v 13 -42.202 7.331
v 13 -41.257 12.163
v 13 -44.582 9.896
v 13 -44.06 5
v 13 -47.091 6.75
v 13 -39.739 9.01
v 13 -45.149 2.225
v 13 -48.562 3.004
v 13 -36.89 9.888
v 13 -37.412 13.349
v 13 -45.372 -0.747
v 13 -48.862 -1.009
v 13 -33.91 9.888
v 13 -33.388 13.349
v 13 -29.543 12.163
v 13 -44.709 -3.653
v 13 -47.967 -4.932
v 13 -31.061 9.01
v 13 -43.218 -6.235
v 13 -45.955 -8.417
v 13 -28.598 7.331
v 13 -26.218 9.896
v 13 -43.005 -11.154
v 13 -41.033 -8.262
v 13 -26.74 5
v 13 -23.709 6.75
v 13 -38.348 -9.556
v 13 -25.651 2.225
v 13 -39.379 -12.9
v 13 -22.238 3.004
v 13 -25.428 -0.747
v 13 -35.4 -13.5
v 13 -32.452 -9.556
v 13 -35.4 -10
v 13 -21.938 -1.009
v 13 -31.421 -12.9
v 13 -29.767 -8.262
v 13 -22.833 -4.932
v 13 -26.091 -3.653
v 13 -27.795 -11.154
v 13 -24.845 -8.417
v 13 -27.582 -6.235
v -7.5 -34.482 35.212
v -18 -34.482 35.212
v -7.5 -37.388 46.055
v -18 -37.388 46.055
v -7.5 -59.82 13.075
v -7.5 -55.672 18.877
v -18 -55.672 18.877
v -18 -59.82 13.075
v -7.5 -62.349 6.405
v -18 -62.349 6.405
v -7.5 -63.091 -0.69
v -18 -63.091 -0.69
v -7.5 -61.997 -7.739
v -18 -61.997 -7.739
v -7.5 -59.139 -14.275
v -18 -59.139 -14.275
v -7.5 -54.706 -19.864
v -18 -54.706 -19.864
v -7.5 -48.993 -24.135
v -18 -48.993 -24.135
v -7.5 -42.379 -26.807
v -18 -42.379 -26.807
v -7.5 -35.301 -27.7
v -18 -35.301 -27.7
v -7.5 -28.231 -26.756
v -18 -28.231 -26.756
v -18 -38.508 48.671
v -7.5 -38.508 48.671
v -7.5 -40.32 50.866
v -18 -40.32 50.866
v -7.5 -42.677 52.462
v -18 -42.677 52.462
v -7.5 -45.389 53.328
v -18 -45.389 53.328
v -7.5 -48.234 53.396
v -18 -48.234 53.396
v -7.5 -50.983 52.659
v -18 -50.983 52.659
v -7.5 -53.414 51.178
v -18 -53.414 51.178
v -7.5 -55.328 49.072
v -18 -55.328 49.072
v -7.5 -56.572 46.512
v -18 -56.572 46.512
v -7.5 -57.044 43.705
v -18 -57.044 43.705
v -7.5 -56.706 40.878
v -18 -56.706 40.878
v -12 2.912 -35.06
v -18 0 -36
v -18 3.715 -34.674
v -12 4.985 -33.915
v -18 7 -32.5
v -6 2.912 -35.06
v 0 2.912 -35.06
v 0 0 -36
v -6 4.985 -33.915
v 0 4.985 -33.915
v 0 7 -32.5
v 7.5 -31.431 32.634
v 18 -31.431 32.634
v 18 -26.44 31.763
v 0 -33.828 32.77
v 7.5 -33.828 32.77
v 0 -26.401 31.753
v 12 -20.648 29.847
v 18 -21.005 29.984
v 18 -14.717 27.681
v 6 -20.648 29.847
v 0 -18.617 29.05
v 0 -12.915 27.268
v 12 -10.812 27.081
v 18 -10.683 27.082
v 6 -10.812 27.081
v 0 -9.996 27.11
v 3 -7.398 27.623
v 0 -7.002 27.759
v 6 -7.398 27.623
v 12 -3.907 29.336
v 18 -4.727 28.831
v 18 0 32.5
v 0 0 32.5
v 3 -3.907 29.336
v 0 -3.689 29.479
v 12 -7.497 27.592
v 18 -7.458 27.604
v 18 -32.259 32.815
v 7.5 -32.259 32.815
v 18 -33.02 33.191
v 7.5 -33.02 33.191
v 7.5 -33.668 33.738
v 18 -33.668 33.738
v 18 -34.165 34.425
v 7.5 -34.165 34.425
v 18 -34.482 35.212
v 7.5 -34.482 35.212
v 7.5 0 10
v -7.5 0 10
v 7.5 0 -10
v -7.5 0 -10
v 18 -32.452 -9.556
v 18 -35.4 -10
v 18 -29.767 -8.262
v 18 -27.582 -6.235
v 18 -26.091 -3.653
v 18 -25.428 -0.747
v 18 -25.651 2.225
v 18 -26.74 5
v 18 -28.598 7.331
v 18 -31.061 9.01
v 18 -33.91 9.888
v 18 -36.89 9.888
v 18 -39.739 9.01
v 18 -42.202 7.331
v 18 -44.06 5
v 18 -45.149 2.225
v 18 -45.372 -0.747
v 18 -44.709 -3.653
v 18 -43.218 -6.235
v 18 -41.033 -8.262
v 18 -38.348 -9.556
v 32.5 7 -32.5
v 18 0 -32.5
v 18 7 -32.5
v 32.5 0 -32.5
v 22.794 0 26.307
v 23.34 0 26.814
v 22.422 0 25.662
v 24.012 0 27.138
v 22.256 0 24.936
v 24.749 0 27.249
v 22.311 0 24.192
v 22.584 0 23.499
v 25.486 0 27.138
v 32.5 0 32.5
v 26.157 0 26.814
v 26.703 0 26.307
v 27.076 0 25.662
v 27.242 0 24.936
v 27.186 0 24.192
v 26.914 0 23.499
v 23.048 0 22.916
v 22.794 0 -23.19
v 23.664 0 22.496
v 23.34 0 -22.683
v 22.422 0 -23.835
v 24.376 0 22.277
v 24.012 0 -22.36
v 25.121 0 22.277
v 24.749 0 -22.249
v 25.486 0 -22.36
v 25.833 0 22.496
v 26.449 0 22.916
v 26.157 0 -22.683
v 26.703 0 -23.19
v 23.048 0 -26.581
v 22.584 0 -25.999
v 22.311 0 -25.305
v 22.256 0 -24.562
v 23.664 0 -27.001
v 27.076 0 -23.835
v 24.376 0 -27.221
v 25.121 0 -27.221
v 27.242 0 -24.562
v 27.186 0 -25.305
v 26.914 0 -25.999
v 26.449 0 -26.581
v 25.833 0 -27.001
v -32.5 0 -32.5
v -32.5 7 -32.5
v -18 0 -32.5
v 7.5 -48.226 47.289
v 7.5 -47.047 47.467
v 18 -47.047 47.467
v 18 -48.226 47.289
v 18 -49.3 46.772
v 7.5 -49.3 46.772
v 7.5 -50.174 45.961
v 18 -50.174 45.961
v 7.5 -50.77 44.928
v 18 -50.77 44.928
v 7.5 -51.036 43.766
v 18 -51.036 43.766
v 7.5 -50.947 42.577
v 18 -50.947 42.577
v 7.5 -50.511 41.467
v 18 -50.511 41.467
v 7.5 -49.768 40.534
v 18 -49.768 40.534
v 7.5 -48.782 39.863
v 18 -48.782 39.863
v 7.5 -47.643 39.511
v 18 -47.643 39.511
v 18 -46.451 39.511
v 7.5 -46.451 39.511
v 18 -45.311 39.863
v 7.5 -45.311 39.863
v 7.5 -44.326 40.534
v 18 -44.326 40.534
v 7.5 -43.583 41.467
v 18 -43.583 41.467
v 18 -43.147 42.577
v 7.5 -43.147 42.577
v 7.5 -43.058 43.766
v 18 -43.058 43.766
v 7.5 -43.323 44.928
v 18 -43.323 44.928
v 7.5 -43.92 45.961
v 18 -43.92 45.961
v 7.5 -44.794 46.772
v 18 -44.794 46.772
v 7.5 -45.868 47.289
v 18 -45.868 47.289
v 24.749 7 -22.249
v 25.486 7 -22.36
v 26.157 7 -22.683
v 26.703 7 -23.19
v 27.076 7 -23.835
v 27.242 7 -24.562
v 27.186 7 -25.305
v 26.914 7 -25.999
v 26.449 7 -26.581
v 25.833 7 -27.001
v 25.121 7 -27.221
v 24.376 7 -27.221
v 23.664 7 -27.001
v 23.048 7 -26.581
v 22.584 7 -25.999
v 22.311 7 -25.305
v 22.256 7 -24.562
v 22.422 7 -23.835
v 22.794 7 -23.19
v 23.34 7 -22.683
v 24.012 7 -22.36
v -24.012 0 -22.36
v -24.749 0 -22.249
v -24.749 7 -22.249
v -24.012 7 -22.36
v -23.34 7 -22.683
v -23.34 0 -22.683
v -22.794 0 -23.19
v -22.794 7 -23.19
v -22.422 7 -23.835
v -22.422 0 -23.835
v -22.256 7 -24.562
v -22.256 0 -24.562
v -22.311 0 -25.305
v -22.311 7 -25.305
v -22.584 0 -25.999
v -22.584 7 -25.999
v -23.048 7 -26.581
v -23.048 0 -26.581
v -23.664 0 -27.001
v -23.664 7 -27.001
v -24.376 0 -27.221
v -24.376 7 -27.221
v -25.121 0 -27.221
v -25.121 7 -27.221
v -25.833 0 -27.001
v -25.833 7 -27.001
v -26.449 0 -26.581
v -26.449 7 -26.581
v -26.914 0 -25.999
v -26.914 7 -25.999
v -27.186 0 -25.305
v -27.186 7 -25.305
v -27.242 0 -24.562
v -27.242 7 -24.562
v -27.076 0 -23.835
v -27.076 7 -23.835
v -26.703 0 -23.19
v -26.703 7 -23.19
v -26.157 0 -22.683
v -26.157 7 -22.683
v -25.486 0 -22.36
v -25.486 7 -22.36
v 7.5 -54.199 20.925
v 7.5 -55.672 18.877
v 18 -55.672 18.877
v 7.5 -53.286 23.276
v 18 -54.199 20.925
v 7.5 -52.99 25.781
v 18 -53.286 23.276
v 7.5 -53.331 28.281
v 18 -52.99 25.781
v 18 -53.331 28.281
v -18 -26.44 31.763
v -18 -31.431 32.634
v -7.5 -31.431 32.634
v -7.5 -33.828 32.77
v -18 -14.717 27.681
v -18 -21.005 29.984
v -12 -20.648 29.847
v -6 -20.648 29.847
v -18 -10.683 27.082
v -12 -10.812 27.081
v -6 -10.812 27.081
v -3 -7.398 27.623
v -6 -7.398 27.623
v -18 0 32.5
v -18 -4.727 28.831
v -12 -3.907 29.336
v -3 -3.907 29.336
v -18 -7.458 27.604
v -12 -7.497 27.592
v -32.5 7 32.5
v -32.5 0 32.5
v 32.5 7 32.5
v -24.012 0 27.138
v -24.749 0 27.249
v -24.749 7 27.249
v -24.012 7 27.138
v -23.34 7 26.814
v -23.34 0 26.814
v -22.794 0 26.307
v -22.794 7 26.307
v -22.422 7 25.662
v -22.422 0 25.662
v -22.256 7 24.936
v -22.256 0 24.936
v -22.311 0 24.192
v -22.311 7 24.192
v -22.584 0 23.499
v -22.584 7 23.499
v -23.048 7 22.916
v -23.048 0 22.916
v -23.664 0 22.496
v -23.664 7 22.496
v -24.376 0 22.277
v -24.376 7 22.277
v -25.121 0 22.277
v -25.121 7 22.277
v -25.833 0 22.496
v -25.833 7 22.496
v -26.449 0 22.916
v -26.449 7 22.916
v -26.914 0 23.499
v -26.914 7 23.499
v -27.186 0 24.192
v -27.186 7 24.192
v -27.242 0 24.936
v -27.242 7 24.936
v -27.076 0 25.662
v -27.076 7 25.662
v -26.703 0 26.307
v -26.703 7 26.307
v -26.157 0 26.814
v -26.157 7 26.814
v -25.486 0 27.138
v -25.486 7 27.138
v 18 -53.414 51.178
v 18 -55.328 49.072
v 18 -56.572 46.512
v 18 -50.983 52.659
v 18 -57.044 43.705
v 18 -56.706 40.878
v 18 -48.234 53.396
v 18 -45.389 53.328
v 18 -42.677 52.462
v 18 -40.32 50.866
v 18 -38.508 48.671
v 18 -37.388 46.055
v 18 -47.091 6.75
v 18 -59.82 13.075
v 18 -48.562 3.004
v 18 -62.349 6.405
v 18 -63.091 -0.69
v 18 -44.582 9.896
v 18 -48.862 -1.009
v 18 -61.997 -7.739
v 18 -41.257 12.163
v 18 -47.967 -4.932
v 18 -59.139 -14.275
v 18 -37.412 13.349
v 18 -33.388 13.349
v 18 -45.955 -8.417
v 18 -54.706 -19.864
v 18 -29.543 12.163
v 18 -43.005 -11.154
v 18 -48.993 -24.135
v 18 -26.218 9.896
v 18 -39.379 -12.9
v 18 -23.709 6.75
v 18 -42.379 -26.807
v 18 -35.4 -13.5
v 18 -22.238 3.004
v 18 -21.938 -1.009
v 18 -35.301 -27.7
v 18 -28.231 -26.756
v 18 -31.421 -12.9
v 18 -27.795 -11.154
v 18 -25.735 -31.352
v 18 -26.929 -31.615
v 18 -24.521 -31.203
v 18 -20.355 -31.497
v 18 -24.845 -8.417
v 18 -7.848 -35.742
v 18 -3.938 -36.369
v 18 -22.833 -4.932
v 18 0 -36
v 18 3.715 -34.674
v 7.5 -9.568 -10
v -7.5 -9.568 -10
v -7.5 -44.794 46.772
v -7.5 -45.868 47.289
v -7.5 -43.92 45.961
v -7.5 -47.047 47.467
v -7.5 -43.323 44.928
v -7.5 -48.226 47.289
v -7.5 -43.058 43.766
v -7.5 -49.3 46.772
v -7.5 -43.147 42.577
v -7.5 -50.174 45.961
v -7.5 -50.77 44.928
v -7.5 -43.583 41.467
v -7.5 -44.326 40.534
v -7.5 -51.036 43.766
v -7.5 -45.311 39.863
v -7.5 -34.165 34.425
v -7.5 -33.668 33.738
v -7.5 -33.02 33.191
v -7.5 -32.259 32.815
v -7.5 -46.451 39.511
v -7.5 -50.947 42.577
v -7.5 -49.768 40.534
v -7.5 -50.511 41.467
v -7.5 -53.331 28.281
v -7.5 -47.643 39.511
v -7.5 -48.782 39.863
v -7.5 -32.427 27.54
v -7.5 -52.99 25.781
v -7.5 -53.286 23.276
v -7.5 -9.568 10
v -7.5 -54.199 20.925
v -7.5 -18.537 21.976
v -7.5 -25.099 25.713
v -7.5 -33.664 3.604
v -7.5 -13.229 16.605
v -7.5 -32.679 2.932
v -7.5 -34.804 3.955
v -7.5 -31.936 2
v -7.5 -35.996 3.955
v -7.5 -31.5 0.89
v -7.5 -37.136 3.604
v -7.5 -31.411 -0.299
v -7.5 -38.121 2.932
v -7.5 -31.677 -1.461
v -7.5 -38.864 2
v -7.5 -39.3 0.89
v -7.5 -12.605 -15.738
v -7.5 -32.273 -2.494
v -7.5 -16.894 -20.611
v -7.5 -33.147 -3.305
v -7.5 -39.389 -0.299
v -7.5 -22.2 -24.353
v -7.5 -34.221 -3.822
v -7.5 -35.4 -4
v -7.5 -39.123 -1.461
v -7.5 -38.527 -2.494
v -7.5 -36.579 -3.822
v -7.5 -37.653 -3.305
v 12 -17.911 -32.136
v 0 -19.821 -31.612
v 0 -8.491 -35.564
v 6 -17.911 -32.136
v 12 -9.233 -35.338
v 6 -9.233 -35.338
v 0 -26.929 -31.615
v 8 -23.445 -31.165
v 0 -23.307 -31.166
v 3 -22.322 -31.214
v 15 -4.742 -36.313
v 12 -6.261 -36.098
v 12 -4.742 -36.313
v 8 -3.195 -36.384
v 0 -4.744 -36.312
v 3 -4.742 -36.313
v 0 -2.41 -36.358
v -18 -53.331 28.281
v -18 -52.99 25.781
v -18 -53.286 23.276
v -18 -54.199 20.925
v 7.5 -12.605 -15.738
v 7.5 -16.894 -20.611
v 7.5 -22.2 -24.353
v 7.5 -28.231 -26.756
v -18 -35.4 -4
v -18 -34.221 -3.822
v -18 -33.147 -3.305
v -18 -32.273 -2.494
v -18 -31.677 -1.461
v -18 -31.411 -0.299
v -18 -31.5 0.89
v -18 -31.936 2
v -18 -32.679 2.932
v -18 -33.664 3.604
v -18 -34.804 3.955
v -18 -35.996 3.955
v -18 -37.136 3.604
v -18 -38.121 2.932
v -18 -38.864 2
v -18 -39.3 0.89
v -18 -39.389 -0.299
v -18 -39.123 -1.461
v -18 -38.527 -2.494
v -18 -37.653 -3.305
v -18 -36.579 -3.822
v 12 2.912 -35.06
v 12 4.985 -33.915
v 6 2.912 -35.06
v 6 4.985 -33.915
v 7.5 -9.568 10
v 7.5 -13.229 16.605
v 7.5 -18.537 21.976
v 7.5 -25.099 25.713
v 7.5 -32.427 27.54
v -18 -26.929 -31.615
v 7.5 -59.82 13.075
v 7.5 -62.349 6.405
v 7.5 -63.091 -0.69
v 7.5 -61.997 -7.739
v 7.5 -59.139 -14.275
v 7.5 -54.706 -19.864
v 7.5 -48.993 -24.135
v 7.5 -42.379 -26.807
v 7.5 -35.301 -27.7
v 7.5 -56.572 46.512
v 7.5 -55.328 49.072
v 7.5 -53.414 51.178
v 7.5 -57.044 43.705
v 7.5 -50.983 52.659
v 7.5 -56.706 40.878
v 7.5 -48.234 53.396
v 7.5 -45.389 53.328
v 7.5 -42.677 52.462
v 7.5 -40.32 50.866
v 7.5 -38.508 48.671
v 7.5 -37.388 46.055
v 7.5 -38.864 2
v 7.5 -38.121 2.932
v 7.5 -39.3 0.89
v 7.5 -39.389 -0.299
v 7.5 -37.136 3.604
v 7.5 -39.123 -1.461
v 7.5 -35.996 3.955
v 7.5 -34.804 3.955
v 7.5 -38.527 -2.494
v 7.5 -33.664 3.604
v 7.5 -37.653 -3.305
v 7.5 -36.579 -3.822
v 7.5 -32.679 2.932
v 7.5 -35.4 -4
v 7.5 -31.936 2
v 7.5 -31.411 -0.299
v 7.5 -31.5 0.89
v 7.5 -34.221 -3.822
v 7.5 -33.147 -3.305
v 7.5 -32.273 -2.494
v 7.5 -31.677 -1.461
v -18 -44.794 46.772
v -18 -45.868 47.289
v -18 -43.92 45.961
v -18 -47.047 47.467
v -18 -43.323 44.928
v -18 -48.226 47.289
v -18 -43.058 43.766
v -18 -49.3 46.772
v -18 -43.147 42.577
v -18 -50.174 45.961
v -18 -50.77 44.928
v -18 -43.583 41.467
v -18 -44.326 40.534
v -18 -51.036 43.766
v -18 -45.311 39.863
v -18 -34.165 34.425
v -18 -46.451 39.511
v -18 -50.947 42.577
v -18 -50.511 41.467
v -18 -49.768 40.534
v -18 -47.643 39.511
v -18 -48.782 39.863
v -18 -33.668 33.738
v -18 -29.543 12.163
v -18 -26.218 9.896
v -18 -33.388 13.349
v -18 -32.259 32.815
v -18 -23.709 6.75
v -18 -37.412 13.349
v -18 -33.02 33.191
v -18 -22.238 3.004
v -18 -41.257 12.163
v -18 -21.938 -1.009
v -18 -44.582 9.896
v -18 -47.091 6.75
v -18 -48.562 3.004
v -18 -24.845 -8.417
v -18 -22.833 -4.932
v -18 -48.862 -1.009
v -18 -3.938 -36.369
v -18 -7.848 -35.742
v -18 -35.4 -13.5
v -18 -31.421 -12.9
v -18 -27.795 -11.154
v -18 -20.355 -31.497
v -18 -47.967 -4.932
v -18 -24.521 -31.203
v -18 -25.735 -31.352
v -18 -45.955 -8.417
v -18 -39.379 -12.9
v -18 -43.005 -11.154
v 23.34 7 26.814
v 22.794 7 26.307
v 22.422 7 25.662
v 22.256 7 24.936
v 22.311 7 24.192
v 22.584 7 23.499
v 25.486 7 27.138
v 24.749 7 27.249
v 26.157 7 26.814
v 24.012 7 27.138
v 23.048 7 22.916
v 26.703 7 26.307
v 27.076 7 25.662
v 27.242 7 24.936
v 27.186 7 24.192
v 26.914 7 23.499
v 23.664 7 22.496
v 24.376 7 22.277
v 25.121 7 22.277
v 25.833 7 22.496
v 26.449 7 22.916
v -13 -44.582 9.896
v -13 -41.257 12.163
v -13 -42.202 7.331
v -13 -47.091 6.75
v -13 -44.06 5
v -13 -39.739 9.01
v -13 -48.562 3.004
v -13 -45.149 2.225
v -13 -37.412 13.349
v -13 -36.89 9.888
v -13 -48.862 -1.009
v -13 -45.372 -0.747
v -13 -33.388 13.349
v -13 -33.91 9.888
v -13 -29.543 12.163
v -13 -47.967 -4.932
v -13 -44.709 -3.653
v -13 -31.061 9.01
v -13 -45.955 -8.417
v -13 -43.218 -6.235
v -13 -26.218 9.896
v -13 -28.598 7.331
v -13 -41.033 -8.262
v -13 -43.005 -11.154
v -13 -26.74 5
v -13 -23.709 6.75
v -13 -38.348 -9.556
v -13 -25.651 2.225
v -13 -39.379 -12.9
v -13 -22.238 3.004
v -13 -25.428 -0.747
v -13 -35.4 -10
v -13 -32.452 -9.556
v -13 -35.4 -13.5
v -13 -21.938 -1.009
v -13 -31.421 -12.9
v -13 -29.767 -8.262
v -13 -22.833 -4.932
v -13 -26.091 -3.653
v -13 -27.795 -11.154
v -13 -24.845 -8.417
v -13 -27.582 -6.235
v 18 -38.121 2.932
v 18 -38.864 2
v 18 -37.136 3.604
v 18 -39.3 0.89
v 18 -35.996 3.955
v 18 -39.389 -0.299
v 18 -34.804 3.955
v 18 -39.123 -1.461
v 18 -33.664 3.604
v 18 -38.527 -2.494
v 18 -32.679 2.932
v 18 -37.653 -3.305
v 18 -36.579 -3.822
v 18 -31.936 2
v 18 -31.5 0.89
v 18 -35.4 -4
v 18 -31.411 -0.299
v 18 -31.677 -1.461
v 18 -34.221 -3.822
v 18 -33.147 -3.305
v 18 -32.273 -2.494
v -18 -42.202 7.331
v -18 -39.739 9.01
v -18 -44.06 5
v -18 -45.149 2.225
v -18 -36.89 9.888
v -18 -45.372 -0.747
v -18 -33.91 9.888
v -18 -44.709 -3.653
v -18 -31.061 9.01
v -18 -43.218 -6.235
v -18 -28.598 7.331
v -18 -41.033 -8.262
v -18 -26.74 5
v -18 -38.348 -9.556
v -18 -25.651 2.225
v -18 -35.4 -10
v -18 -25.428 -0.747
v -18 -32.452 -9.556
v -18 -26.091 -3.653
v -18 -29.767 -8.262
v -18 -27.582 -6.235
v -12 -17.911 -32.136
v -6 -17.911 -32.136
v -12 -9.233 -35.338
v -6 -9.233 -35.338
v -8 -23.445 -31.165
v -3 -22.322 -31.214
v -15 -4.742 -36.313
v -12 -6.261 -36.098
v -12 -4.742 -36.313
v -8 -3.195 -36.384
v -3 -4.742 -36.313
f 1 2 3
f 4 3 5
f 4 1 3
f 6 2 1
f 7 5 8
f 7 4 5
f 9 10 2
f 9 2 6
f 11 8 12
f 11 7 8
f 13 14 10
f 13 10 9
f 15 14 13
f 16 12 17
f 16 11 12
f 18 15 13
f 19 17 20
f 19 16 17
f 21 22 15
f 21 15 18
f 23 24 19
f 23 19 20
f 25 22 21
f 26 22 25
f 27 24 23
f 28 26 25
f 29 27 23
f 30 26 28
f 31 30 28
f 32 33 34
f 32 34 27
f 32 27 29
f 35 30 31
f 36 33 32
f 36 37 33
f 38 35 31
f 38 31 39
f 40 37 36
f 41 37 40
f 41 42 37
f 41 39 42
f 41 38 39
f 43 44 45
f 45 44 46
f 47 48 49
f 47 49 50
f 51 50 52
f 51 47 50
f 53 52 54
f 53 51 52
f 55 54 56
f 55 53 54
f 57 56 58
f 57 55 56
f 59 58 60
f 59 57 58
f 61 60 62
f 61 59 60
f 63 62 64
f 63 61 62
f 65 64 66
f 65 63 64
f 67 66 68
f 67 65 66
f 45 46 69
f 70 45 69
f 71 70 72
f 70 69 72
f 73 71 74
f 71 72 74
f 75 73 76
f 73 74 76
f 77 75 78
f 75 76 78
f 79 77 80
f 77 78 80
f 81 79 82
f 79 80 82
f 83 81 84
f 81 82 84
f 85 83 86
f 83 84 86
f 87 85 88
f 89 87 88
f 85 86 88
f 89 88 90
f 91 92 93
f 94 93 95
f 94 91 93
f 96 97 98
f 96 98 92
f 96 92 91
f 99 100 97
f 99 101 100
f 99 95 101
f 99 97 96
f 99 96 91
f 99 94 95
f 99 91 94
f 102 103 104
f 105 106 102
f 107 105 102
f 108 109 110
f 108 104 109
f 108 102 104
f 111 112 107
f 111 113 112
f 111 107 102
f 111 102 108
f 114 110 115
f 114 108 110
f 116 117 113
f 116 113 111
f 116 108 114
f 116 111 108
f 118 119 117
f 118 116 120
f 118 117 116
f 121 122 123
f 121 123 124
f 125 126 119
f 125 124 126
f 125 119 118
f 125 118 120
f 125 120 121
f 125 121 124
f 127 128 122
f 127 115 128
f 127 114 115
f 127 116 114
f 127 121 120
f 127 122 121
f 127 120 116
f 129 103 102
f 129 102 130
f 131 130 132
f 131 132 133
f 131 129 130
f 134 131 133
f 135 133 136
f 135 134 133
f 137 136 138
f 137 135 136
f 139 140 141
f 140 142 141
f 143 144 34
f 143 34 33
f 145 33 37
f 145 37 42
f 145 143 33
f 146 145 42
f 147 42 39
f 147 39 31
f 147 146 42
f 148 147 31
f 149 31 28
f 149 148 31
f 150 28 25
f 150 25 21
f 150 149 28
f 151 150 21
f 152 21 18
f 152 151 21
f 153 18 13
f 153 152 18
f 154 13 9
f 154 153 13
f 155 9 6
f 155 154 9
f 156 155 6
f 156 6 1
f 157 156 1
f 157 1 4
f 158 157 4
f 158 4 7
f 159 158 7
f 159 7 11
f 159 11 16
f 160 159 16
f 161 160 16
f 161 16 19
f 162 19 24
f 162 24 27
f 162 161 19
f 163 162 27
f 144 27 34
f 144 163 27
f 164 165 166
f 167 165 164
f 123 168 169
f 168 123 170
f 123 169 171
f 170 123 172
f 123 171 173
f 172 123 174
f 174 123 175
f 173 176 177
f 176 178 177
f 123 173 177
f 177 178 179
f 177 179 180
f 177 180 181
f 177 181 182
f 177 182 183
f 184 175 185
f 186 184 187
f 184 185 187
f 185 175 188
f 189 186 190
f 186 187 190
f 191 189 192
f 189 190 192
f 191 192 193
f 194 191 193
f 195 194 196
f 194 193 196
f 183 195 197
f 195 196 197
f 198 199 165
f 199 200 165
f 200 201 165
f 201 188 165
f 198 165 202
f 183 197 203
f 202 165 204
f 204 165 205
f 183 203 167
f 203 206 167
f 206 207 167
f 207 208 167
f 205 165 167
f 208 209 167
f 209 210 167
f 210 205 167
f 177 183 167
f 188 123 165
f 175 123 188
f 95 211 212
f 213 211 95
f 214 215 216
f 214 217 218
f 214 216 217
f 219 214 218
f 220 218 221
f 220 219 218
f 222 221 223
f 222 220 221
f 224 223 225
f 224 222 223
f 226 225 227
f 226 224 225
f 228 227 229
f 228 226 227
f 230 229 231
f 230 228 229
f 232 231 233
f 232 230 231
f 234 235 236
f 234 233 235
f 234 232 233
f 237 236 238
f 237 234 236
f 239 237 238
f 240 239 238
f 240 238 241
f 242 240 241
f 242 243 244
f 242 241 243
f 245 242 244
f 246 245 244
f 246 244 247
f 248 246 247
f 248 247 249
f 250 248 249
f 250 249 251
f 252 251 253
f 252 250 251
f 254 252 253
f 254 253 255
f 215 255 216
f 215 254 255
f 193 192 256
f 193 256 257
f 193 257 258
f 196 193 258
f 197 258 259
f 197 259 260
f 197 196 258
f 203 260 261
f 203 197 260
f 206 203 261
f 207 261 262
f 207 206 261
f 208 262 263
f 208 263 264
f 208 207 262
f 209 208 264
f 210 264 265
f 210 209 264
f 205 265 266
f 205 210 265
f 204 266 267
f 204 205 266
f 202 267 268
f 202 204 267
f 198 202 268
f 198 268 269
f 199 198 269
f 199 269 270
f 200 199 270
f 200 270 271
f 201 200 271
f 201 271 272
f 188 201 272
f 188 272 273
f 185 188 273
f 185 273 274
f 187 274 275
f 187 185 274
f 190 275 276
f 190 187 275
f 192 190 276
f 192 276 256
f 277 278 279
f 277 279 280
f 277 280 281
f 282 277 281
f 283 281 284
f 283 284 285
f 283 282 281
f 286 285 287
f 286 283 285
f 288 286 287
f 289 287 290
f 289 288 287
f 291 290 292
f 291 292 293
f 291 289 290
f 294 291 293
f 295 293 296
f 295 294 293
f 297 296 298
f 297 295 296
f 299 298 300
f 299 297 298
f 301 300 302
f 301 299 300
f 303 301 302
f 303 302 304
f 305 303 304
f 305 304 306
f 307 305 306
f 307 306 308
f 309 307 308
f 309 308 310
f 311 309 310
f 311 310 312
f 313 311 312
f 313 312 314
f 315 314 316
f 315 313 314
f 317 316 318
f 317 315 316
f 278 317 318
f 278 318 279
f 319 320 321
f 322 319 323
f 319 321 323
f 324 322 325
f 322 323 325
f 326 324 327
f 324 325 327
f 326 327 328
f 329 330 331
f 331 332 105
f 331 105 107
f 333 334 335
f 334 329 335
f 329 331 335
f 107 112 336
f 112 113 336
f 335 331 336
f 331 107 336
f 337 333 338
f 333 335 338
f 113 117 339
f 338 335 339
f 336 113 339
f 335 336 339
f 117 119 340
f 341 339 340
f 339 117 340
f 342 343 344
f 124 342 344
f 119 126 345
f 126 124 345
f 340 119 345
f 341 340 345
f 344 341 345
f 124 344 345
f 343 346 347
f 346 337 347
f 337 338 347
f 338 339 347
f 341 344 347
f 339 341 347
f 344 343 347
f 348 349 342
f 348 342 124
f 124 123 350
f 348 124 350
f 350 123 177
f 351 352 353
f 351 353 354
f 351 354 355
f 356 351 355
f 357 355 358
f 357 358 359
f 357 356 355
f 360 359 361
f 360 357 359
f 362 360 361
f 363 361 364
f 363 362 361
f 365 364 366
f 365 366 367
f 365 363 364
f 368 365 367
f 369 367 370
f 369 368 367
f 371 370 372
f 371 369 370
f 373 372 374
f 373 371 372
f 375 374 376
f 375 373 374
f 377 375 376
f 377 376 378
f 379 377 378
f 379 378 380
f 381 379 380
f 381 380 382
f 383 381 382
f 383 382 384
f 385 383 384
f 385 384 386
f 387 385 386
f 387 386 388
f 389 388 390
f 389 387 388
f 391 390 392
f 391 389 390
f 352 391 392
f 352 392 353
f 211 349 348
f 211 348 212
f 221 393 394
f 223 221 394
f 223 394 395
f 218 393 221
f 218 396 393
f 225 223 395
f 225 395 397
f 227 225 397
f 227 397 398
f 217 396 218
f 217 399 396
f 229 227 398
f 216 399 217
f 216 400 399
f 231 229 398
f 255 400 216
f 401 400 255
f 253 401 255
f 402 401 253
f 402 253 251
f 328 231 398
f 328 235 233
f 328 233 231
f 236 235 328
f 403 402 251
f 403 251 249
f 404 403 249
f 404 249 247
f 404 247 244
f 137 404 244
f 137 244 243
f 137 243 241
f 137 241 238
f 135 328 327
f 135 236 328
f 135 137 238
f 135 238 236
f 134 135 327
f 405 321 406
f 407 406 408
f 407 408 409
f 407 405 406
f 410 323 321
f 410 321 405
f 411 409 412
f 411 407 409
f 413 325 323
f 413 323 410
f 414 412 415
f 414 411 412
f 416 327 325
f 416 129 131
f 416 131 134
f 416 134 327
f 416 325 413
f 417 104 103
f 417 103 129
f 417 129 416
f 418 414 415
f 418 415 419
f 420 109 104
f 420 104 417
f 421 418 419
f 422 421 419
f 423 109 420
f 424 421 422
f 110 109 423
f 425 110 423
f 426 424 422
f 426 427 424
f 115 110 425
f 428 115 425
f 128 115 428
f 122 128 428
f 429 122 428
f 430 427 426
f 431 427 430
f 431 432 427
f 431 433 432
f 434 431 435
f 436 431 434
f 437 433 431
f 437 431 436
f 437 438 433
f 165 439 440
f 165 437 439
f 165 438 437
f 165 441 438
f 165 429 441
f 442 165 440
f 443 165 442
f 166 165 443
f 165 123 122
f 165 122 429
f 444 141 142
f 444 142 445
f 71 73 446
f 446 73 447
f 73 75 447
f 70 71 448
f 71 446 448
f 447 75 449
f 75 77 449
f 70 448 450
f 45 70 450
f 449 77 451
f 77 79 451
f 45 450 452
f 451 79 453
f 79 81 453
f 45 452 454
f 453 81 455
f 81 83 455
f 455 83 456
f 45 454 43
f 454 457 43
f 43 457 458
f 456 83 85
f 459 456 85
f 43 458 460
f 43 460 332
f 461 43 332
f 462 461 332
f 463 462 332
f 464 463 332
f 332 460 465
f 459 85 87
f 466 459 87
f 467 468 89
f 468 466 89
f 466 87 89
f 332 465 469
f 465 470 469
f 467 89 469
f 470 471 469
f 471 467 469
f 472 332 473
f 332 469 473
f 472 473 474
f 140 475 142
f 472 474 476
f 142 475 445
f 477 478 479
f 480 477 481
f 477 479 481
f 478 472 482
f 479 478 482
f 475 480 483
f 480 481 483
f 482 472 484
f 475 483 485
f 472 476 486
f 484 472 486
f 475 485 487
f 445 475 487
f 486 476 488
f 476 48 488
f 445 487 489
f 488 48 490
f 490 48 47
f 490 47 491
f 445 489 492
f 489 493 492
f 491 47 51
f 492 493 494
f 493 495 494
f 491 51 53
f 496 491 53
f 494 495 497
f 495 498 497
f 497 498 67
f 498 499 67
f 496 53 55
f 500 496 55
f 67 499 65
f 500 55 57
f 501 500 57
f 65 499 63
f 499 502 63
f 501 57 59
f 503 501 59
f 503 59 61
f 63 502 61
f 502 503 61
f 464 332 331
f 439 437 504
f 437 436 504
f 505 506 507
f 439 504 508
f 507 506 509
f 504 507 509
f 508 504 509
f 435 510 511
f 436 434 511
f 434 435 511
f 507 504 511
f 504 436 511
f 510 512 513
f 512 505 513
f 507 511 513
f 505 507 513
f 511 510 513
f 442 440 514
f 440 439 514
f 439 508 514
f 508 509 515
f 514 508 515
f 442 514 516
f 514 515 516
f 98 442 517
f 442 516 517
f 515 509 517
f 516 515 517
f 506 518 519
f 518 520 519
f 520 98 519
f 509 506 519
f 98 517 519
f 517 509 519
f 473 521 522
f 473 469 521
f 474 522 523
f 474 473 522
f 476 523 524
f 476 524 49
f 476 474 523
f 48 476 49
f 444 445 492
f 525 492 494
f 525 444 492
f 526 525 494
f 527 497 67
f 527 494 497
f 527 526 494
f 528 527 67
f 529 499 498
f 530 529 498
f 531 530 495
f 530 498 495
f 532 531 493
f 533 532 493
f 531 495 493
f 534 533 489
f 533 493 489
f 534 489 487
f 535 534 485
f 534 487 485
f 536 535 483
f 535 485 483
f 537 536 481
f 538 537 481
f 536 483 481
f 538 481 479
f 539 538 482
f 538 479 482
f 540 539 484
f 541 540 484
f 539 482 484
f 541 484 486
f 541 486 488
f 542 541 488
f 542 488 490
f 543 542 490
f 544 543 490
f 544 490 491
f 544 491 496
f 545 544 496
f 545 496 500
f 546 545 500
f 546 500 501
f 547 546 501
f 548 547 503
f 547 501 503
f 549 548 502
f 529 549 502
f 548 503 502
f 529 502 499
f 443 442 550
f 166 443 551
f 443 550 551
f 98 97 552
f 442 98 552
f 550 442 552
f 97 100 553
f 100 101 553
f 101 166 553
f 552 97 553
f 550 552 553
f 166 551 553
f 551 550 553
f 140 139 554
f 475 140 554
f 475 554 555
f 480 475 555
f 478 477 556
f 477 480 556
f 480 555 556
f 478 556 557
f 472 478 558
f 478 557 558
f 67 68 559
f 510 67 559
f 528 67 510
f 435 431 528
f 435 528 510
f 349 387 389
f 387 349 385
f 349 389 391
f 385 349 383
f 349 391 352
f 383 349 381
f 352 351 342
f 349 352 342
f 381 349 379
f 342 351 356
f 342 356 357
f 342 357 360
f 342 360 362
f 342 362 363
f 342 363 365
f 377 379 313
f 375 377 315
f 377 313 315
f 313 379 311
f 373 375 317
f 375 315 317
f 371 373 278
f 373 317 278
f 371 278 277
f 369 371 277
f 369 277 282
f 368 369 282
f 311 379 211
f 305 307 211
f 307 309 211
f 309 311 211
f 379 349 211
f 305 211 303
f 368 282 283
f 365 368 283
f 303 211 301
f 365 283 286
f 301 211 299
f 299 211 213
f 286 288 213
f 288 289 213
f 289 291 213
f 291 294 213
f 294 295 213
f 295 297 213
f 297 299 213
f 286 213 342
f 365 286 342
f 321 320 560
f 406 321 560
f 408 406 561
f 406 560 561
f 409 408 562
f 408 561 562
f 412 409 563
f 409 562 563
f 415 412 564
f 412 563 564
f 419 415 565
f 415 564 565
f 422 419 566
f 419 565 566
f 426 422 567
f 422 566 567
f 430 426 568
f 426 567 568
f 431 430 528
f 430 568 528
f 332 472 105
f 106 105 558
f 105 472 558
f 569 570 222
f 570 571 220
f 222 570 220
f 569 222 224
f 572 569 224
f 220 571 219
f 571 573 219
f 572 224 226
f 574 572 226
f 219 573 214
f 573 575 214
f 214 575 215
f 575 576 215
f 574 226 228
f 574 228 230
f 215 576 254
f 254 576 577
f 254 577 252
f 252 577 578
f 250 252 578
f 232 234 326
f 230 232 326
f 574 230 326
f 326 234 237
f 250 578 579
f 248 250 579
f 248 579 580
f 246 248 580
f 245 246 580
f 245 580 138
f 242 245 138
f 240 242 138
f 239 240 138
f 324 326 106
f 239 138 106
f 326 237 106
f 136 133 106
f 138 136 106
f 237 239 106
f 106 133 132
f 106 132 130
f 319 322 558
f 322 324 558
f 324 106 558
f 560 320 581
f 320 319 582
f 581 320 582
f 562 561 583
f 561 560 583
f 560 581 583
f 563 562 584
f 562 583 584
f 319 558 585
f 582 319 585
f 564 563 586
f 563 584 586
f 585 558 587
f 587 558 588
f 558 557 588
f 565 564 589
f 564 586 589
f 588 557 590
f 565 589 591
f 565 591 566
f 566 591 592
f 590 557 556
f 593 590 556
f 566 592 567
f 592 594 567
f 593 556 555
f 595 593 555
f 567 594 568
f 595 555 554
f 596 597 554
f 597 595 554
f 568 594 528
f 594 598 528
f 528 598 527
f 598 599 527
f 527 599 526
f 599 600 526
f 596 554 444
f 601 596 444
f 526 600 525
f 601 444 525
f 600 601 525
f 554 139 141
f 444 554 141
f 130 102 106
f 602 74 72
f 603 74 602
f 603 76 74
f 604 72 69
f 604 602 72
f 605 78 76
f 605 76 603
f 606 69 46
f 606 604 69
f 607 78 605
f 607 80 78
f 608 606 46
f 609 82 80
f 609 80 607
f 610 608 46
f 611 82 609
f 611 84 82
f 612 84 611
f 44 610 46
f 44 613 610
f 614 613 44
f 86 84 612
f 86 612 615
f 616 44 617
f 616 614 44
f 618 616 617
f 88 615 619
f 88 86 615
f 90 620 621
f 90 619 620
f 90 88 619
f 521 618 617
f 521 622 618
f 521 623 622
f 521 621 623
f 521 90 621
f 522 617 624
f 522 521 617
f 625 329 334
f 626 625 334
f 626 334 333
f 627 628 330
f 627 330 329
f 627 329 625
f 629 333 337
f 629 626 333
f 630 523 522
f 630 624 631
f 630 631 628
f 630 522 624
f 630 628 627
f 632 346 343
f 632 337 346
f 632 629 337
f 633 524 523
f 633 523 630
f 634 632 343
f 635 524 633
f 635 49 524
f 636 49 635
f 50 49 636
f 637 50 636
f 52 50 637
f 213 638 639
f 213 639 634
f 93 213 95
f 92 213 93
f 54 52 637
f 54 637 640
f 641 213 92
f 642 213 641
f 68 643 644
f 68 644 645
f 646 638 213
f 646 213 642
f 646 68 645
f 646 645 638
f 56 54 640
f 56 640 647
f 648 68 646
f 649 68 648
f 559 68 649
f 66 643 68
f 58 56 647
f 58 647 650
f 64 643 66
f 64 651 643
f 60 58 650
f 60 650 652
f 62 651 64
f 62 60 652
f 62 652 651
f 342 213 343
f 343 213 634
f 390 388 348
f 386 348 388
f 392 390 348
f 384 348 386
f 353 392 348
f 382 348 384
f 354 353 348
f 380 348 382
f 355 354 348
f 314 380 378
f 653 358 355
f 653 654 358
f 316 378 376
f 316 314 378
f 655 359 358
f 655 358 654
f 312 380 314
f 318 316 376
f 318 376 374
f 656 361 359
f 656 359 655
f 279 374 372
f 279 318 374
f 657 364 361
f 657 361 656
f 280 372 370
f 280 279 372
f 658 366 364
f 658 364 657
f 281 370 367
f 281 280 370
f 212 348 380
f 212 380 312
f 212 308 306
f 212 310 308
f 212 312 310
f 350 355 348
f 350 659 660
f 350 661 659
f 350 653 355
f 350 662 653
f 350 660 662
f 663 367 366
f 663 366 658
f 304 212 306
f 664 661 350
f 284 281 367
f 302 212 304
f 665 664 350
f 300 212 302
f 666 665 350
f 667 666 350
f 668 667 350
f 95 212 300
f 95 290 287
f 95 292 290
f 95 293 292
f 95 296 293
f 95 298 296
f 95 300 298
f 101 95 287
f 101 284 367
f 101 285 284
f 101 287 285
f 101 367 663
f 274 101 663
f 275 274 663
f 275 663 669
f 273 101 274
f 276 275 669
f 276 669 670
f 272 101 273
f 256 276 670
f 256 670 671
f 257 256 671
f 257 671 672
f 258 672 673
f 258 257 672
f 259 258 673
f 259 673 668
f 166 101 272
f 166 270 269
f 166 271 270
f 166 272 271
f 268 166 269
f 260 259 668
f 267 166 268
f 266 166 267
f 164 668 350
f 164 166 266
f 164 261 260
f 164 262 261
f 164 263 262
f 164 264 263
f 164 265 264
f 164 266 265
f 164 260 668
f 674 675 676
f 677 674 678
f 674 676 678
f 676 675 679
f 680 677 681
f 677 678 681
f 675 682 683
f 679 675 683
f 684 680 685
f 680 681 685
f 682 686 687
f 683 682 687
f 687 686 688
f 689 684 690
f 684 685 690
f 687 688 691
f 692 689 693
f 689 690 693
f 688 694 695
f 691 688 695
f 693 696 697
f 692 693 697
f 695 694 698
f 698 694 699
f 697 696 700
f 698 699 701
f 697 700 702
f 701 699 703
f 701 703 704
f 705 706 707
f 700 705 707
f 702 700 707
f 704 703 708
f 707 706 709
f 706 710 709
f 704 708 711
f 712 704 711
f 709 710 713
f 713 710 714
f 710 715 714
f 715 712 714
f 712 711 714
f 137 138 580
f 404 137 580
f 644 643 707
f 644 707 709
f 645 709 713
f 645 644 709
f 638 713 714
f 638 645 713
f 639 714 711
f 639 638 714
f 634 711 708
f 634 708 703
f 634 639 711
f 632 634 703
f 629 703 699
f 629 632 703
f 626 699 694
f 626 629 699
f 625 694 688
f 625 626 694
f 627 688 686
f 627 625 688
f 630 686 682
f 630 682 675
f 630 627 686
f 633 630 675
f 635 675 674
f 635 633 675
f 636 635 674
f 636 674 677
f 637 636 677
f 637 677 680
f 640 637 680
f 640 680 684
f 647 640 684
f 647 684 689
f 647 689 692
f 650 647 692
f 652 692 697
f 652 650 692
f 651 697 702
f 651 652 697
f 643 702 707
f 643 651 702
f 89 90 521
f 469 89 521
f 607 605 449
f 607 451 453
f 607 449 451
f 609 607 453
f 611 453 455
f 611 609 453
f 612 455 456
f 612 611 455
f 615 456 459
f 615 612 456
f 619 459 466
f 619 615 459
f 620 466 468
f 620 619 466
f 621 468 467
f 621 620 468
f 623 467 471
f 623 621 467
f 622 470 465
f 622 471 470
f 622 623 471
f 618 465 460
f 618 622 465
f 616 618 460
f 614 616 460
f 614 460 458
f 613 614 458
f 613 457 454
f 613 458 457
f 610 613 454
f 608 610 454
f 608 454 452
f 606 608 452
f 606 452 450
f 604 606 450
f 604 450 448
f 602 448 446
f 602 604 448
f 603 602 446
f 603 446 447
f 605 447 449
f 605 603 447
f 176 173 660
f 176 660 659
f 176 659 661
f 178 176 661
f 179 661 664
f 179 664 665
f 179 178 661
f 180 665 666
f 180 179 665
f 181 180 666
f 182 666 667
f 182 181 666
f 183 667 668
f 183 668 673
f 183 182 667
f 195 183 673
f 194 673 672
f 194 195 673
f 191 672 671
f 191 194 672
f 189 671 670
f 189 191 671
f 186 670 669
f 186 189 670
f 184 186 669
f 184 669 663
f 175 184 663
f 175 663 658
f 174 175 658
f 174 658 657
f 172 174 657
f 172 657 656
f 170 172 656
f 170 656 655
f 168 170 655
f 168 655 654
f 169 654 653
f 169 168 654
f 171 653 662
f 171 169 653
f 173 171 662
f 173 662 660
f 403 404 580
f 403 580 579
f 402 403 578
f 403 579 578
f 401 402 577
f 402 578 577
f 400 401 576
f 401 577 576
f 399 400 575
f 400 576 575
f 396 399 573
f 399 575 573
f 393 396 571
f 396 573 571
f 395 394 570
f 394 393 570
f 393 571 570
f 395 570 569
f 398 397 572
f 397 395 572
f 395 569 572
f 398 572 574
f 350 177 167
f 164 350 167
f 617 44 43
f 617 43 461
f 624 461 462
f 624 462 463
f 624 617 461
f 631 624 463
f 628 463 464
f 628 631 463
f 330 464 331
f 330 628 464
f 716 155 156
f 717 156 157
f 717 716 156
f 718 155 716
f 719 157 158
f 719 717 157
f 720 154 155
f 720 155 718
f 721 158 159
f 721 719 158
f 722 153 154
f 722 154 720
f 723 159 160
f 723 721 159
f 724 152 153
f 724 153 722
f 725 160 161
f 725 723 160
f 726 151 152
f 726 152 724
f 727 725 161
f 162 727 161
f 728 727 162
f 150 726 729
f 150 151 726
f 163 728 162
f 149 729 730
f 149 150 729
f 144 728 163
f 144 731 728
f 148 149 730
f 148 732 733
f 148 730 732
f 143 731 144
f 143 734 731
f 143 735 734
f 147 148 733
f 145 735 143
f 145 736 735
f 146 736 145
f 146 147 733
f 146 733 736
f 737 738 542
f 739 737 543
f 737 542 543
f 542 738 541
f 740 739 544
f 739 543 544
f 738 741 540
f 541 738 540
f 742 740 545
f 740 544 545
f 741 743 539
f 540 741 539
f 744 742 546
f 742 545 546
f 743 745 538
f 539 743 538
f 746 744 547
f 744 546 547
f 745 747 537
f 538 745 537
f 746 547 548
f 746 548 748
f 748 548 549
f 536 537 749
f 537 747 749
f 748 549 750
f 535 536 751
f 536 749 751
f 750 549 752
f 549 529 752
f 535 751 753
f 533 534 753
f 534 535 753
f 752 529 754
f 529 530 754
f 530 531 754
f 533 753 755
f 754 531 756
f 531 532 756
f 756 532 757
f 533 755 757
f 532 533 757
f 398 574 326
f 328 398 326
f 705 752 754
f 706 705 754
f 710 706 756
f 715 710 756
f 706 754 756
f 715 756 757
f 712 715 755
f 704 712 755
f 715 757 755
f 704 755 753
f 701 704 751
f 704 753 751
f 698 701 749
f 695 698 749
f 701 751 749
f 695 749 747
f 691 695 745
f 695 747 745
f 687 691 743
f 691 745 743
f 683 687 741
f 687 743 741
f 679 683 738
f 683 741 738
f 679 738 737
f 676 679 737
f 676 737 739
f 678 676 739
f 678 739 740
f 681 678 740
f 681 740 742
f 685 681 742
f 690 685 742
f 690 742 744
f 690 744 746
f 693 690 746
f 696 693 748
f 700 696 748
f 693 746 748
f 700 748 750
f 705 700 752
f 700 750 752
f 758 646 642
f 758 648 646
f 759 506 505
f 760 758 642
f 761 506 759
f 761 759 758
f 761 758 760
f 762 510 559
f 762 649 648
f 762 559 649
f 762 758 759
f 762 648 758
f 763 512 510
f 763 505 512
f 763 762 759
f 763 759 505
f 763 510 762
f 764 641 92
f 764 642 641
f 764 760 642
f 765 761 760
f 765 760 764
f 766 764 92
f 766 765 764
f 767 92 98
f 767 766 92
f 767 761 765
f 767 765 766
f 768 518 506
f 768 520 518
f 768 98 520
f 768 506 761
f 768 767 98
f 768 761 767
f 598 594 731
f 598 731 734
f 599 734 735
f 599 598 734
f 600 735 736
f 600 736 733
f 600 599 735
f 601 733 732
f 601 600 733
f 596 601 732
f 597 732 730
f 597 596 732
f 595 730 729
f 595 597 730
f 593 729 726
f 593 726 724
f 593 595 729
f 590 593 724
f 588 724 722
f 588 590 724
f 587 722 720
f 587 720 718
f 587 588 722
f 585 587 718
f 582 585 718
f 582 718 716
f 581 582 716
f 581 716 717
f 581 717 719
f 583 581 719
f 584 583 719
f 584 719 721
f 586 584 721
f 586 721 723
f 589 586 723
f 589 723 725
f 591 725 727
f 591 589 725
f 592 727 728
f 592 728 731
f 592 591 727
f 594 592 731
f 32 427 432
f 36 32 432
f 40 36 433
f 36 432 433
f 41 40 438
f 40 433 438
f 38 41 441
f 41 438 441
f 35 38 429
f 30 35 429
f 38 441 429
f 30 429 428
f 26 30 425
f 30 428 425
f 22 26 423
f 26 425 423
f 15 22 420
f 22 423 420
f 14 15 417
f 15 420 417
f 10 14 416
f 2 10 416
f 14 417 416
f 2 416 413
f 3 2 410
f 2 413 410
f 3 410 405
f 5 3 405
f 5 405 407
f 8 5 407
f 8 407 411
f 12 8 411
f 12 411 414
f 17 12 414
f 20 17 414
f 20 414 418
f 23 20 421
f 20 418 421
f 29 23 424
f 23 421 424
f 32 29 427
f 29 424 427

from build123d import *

# Parameters (mm, degrees)
SKETCH1_W                       = 65
SKETCH1_H                       = 65
SKETCH1_R                       = 2.5
BOSS_EXTRUDE1_DEPTH             = 7
BOSS_EXTRUDE2_START             = 7.5
SKETCH2_R                       = 4
BOSS_EXTRUDE2_DEPTH             = 10.5
BOSS_EXTRUDE3_REACH             = 80.065
BOSS_EXTRUDE3_DIRECTION_2_REACH = 80.065
BOSS_EXTRUDE7_START             = -18
BOSS_EXTRUDE7_DEPTH             = 36
SKETCH6_W                       = 15
SKETCH6_H                       = 30
CUT_EXTRUDE1_DEPTH              = 81.472268493
SKETCH8_R                       = 13.5
SKETCH8_R_2                     = 10
CUT_EXTRUDE3_DEPTH              = 5
CUT_EXTRUDE4_DEPTH              = 91.23260041
CUT_EXTRUDE4_DEPTH_BACK         = 91.23260041
SKETCH7_R                       = 4
FILLET16_R                      = 3.5
FILLET17_R                      = 3.5
FILLET19_R                      = 10


with BuildPart() as part:
    # Sketch1 → Boss-Extrude1 (new body)
    with BuildSketch(Plane(origin=(0, 0, 0), x_dir=(1, 0, 0), z_dir=(0, 1, 0))):
        Rectangle(SKETCH1_W, SKETCH1_H)
        with Locations(Location((-24.748737342, 24.748737342, 0), (0, 0, 270))):
            Circle(SKETCH1_R, mode=Mode.SUBTRACT)
        with Locations(Location((24.748737342, 24.748737342, 0), (0, 0, 270))):
            Circle(SKETCH1_R, mode=Mode.SUBTRACT)
        with Locations(Location((24.748737342, -24.748737342, 0), (0, 0, 270))):
            Circle(SKETCH1_R, mode=Mode.SUBTRACT)
        with Locations(Location((-24.748737342, -24.748737342, 0), (0, 0, 270))):
            Circle(SKETCH1_R, mode=Mode.SUBTRACT)
    extrude(amount=BOSS_EXTRUDE1_DEPTH)

    # Sketch2 → Boss-Extrude2 (add)
    with BuildSketch(Plane(origin=(0, 0, 0), x_dir=(0, 0, -1), z_dir=(1, 0, 0)).offset(BOSS_EXTRUDE2_START)):
        with BuildLine():
            Line((10, -9.568043047), (10, 1.517986249))
            Line((10, 1.517986249), (-10, 1.517986249))
            Line((-10, 1.517986249), (-10, -9.568043047))
            ThreePointArc((-10, -9.568043047), (0, -63.1), (10, -9.568043047))
        make_face()
        with Locations((0, -35.4)):
            Circle(SKETCH2_R, mode=Mode.SUBTRACT)
    boss_extrude2 = extrude(amount=BOSS_EXTRUDE2_DEPTH)

    # Mirror1: Boss-Extrude2 across plane
    add(boss_extrude2.mirror(Plane(origin=(0, 0, 0), x_dir=(0, 0, 1), z_dir=(1, 0, 0))))

    # Boss-Extrude3: up to this face of the body (flat: up to its plane)
    boss_extrude3_end = Plane(part.part.faces().sort_by_distance((18, -62.260311367, 0))[0])
    # Sketch3 → Boss-Extrude3 (add, up to the picked face)
    with BuildSketch(Plane(origin=(0, 0, 0), x_dir=(0, 0, -1), z_dir=(1, 0, 0)), mode=Mode.PRIVATE) as boss_extrude3_sk1:
        with BuildLine():
            Line((32.5, 0), (10, 0))
            Line((10, 0), (10, -4.266577445))
            Line((10, -4.266577445), (10, -9.568043047))
            ThreePointArc((10, -9.568043047), (20.611340647, -16.894253954), (26.756145388, -28.230712451))
            Line((26.756145388, -28.230712451), (31.61497925, -26.928791841))
            add(Edge.make_bspline(
                [(31.61497925, -26.928791841), (29.055948241, -17.442715383), (38.347474054, -9.80951762), (36, 0)],
                knots=[0, 0, 0, 0, 1, 1, 1, 1], degree=3))
            add(Edge.make_bspline(
                [(36, 0), (35.140208775, 3.592856394), (34.071491306, 4.753858958), (32.5, 7)],
                knots=[0, 0, 0, 0, 1, 1, 1, 1], degree=3))
            Line((32.5, 7), (32.5, 0))
        make_face()
    boss_extrude3_tool1 = split(extrude(boss_extrude3_sk1.sketch, amount=BOSS_EXTRUDE3_REACH, mode=Mode.PRIVATE), bisect_by=boss_extrude3_end, keep=Keep.BOTH, mode=Mode.PRIVATE)
    # Sketch3 → Boss-Extrude3 (add, up to the picked face)
    with BuildSketch(Plane(origin=(0, 0, 0), x_dir=(0, 0, -1), z_dir=(1, 0, 0)), mode=Mode.PRIVATE) as boss_extrude3_sk2:
        with BuildLine():
            Line((-32.5, 0), (-10, 0))
            Line((-10, 0), (-10, -9.568043047))
            ThreePointArc((-10, -9.568043047), (-24.698665766, -22.859429463), (-26.756145388, -42.569287549))
            Line((-26.756145388, -42.569287549), (-31.58577452, -43.863382775))
            add(Edge.make_bspline(
                [(-31.58577452, -43.863382775), (-37.603765688, -19.008690412), (-18.117487997, -15.033656142), (-32.5, 0)],
                knots=[0, 0, 0, 0, 1, 1, 1, 1], degree=3))
        make_face()
    boss_extrude3_tool2 = split(extrude(boss_extrude3_sk2.sketch, amount=BOSS_EXTRUDE3_REACH, mode=Mode.PRIVATE), bisect_by=boss_extrude3_end, keep=Keep.BOTH, mode=Mode.PRIVATE)
    add(boss_extrude3_tool1.solids().sort_by(Axis((0, -9.525708, -24.617363), (1, 0, 0)))[0])
    add(boss_extrude3_tool2.solids().sort_by(Axis((0, -14.994615, 23.210716), (1, 0, 0)))[0])

    # Boss-Extrude3 direction 2: up to this face of the body (flat: up to its plane)
    boss_extrude3_direction_2_end = Plane(part.part.faces().sort_by_distance((-18, -62.260311367, 0))[0])
    # Sketch3 → Boss-Extrude3 direction 2 (add, up to the picked face)
    with BuildSketch(Plane(origin=(0, 0, 0), x_dir=(0, 0, -1), z_dir=(1, 0, 0)), mode=Mode.PRIVATE) as boss_extrude3_direction_2_sk1:
        with BuildLine():
            Line((32.5, 0), (10, 0))
            Line((10, 0), (10, -4.266577445))
            Line((10, -4.266577445), (10, -9.568043047))
            ThreePointArc((10, -9.568043047), (20.611340647, -16.894253954), (26.756145388, -28.230712451))
            Line((26.756145388, -28.230712451), (31.61497925, -26.928791841))
            add(Edge.make_bspline(
                [(31.61497925, -26.928791841), (29.055948241, -17.442715383), (38.347474054, -9.80951762), (36, 0)],
                knots=[0, 0, 0, 0, 1, 1, 1, 1], degree=3))
            add(Edge.make_bspline(
                [(36, 0), (35.140208775, 3.592856394), (34.071491306, 4.753858958), (32.5, 7)],
                knots=[0, 0, 0, 0, 1, 1, 1, 1], degree=3))
            Line((32.5, 7), (32.5, 0))
        make_face()
    boss_extrude3_direction_2_tool1 = split(extrude(boss_extrude3_direction_2_sk1.sketch, amount=-BOSS_EXTRUDE3_DIRECTION_2_REACH, mode=Mode.PRIVATE), bisect_by=boss_extrude3_direction_2_end, keep=Keep.BOTH, mode=Mode.PRIVATE)
    # Sketch3 → Boss-Extrude3 direction 2 (add, up to the picked face)
    with BuildSketch(Plane(origin=(0, 0, 0), x_dir=(0, 0, -1), z_dir=(1, 0, 0)), mode=Mode.PRIVATE) as boss_extrude3_direction_2_sk2:
        with BuildLine():
            Line((-32.5, 0), (-10, 0))
            Line((-10, 0), (-10, -9.568043047))
            ThreePointArc((-10, -9.568043047), (-24.698665766, -22.859429463), (-26.756145388, -42.569287549))
            Line((-26.756145388, -42.569287549), (-31.58577452, -43.863382775))
            add(Edge.make_bspline(
                [(-31.58577452, -43.863382775), (-37.603765688, -19.008690412), (-18.117487997, -15.033656142), (-32.5, 0)],
                knots=[0, 0, 0, 0, 1, 1, 1, 1], degree=3))
        make_face()
    boss_extrude3_direction_2_tool2 = split(extrude(boss_extrude3_direction_2_sk2.sketch, amount=-BOSS_EXTRUDE3_DIRECTION_2_REACH, mode=Mode.PRIVATE), bisect_by=boss_extrude3_direction_2_end, keep=Keep.BOTH, mode=Mode.PRIVATE)
    add(boss_extrude3_direction_2_tool1.solids().sort_by(Axis((0, -9.525708, -24.617363), (-1, 0, 0)))[0])
    add(boss_extrude3_direction_2_tool2.solids().sort_by(Axis((0, -14.994615, 23.210716), (-1, 0, 0)))[0])

    # Sketch4 → Boss-Extrude7 (add)
    with BuildSketch(Plane(origin=(0, 0, 0), x_dir=(0, 0, -1), z_dir=(1, 0, 0)).offset(BOSS_EXTRUDE7_START)):
        with BuildLine():
            Line((-27.539944815, -32.426544169), (-33.139527425, -33.926947807))
            Line((-33.139527425, -33.926947807), (-55.714110897, -39.975789218))
            Line((-55.714110897, -39.975789218), (-50.537729995, -59.294305744))
            Line((-50.537729995, -59.294305744), (-22.363563913, -51.745060694))
            ThreePointArc((-22.363563913, -51.745060694), (-26.756145388, -42.569287549), (-27.539944815, -32.426544169))
        make_face()
    extrude(amount=BOSS_EXTRUDE7_DEPTH)

    # Sketch6 → Cut-Extrude1 (cut, through all)
    with BuildSketch(Plane(origin=(0, -23.369391384, -6.261809549), x_dir=(1, 0, 0), z_dir=(0, 0.9659258262890686, 0.2588190451025195))):
        with Locations((0, -49.162194197)):
            Rectangle(SKETCH6_W, SKETCH6_H)
    extrude(amount=-CUT_EXTRUDE1_DEPTH, mode=Mode.SUBTRACT)

    # Sketch8 → Cut-Extrude3 (cut)
    with BuildSketch(Plane(origin=(18, 0, 0), x_dir=(0, 0, -1), z_dir=(1, 0, 0))):
        with Locations((0, -35.4)):
            Circle(SKETCH8_R)
        with Locations((0, -35.4)):
            Circle(SKETCH8_R_2, mode=Mode.SUBTRACT)
    cut_extrude3 = extrude(amount=-CUT_EXTRUDE3_DEPTH, mode=Mode.SUBTRACT)

    # Mirror2: Cut-Extrude3 across plane
    add(cut_extrude3.mirror(Plane(origin=(0, 0, 0), x_dir=(0, 0, 1), z_dir=(1, 0, 0))), mode=Mode.SUBTRACT)

    # Sketch7 → Cut-Extrude4 (cut, two sides: drawn at the far end of the back side and taken through both)
    with BuildSketch(Plane(origin=(0, 0, 0), x_dir=(0, 0, -1), z_dir=(1, 0, 0)).offset(-CUT_EXTRUDE4_DEPTH_BACK)):
        with Locations(Location((-43.466662183, -47.04685703, 0), (0, 0, 180))):
            Circle(SKETCH7_R)
        with BuildLine():
            Line((-40.878471732, -56.706115293), (-40.166415946, -59.363543662))
            Line((-40.166415946, -59.363543662), (-53.107989986, -62.831227975))
            Line((-53.107989986, -62.831227975), (-59.564338385, -38.735807717))
            Line((-59.564338385, -38.735807717), (-46.622764346, -35.268123405))
            Line((-46.622764346, -35.268123405), (-46.054852634, -37.387598767))
            ThreePointArc((-46.054852634, -37.387598767), (-53.125920446, -49.635047481), (-40.878471732, -56.706115293))
        make_face()
    extrude(amount=CUT_EXTRUDE4_DEPTH + CUT_EXTRUDE4_DEPTH_BACK, mode=Mode.SUBTRACT)

    # Fillet16
    # the kernel refuses this fillet: 3.5 mm, written as the material it adds along each edge
    with BuildSketch(Plane(origin=(18, -33.827938234, 32.770018668), x_dir=(0, -0.25881904510252074, 0.9659258262890684), z_dir=(-1, 0, 0))) as fillet16_piece_1_section:
        with BuildLine():
            CenterArc((2.528363882, 3.5), FILLET16_R, 200.393732709, 69.606267291)
            Line((-0.752256512, 2.280356677), (-0.81786892, 2.255963811))
            ThreePointArc((-0.81786892, 2.255963811), (-0.421453854, 1.125231743), (-0.06723899, -0.019465823))
            Line((-0.06723899, -0.019465823), (0, -0.07))
            Line((0, -0.07), (2.528363882, -0.07))
            Line((2.528363882, -0.07), (2.528363882, 0))
        make_face()
    fillet16_piece_1 = extrude(amount=10.5, mode=Mode.PRIVATE)
    fillet16_piece_1 = split(fillet16_piece_1, bisect_by=Plane(origin=(12.75, -33.904495307, 33.055733556), z_dir=(0, 0.9659258262890686, 0.2588190451025195)), keep=Keep.TOP, mode=Mode.PRIVATE)
    add(fillet16_piece_1)

    # Fillet17
    # the kernel refuses this fillet: 3.5 mm, written as the material it adds along each edge
    with BuildSketch(Plane(origin=(-18, -33.827938234, 32.770018668), x_dir=(0, -0.25881904510252074, 0.9659258262890684), z_dir=(1, 0, 0))) as fillet17_piece_1_section:
        with BuildLine():
            CenterArc((2.528363882, -3.5), FILLET17_R, 90, 69.606267291)
            Line((-0.752256512, -2.280356677), (-0.81786892, -2.255963811))
            ThreePointArc((-0.81786892, -2.255963811), (-0.421453854, -1.125231743), (-0.06723899, 0.019465823))
            Line((-0.06723899, 0.019465823), (0, 0.07))
            Line((0, 0.07), (2.528363882, 0.07))
            Line((2.528363882, 0.07), (2.528363882, 0))
        make_face()
    fillet17_piece_1 = extrude(amount=10.5, mode=Mode.PRIVATE)
    fillet17_piece_1 = split(fillet17_piece_1, bisect_by=Plane(origin=(-12.75, -33.904495307, 33.055733556), z_dir=(0, 0.9659258262890686, 0.2588190451025195)), keep=Keep.TOP, mode=Mode.PRIVATE)
    add(fillet17_piece_1)

    # Fillet19
    fillet19_edges = [part.edges().sort_by_distance(p)[0] for p in [
        (12.75, -51.745060694, 22.363563913),
        (-12.75, -51.745060694, 22.363563913),
    ]]
    fillet(fillet19_edges, radius=FILLET19_R)


solid = part.part
